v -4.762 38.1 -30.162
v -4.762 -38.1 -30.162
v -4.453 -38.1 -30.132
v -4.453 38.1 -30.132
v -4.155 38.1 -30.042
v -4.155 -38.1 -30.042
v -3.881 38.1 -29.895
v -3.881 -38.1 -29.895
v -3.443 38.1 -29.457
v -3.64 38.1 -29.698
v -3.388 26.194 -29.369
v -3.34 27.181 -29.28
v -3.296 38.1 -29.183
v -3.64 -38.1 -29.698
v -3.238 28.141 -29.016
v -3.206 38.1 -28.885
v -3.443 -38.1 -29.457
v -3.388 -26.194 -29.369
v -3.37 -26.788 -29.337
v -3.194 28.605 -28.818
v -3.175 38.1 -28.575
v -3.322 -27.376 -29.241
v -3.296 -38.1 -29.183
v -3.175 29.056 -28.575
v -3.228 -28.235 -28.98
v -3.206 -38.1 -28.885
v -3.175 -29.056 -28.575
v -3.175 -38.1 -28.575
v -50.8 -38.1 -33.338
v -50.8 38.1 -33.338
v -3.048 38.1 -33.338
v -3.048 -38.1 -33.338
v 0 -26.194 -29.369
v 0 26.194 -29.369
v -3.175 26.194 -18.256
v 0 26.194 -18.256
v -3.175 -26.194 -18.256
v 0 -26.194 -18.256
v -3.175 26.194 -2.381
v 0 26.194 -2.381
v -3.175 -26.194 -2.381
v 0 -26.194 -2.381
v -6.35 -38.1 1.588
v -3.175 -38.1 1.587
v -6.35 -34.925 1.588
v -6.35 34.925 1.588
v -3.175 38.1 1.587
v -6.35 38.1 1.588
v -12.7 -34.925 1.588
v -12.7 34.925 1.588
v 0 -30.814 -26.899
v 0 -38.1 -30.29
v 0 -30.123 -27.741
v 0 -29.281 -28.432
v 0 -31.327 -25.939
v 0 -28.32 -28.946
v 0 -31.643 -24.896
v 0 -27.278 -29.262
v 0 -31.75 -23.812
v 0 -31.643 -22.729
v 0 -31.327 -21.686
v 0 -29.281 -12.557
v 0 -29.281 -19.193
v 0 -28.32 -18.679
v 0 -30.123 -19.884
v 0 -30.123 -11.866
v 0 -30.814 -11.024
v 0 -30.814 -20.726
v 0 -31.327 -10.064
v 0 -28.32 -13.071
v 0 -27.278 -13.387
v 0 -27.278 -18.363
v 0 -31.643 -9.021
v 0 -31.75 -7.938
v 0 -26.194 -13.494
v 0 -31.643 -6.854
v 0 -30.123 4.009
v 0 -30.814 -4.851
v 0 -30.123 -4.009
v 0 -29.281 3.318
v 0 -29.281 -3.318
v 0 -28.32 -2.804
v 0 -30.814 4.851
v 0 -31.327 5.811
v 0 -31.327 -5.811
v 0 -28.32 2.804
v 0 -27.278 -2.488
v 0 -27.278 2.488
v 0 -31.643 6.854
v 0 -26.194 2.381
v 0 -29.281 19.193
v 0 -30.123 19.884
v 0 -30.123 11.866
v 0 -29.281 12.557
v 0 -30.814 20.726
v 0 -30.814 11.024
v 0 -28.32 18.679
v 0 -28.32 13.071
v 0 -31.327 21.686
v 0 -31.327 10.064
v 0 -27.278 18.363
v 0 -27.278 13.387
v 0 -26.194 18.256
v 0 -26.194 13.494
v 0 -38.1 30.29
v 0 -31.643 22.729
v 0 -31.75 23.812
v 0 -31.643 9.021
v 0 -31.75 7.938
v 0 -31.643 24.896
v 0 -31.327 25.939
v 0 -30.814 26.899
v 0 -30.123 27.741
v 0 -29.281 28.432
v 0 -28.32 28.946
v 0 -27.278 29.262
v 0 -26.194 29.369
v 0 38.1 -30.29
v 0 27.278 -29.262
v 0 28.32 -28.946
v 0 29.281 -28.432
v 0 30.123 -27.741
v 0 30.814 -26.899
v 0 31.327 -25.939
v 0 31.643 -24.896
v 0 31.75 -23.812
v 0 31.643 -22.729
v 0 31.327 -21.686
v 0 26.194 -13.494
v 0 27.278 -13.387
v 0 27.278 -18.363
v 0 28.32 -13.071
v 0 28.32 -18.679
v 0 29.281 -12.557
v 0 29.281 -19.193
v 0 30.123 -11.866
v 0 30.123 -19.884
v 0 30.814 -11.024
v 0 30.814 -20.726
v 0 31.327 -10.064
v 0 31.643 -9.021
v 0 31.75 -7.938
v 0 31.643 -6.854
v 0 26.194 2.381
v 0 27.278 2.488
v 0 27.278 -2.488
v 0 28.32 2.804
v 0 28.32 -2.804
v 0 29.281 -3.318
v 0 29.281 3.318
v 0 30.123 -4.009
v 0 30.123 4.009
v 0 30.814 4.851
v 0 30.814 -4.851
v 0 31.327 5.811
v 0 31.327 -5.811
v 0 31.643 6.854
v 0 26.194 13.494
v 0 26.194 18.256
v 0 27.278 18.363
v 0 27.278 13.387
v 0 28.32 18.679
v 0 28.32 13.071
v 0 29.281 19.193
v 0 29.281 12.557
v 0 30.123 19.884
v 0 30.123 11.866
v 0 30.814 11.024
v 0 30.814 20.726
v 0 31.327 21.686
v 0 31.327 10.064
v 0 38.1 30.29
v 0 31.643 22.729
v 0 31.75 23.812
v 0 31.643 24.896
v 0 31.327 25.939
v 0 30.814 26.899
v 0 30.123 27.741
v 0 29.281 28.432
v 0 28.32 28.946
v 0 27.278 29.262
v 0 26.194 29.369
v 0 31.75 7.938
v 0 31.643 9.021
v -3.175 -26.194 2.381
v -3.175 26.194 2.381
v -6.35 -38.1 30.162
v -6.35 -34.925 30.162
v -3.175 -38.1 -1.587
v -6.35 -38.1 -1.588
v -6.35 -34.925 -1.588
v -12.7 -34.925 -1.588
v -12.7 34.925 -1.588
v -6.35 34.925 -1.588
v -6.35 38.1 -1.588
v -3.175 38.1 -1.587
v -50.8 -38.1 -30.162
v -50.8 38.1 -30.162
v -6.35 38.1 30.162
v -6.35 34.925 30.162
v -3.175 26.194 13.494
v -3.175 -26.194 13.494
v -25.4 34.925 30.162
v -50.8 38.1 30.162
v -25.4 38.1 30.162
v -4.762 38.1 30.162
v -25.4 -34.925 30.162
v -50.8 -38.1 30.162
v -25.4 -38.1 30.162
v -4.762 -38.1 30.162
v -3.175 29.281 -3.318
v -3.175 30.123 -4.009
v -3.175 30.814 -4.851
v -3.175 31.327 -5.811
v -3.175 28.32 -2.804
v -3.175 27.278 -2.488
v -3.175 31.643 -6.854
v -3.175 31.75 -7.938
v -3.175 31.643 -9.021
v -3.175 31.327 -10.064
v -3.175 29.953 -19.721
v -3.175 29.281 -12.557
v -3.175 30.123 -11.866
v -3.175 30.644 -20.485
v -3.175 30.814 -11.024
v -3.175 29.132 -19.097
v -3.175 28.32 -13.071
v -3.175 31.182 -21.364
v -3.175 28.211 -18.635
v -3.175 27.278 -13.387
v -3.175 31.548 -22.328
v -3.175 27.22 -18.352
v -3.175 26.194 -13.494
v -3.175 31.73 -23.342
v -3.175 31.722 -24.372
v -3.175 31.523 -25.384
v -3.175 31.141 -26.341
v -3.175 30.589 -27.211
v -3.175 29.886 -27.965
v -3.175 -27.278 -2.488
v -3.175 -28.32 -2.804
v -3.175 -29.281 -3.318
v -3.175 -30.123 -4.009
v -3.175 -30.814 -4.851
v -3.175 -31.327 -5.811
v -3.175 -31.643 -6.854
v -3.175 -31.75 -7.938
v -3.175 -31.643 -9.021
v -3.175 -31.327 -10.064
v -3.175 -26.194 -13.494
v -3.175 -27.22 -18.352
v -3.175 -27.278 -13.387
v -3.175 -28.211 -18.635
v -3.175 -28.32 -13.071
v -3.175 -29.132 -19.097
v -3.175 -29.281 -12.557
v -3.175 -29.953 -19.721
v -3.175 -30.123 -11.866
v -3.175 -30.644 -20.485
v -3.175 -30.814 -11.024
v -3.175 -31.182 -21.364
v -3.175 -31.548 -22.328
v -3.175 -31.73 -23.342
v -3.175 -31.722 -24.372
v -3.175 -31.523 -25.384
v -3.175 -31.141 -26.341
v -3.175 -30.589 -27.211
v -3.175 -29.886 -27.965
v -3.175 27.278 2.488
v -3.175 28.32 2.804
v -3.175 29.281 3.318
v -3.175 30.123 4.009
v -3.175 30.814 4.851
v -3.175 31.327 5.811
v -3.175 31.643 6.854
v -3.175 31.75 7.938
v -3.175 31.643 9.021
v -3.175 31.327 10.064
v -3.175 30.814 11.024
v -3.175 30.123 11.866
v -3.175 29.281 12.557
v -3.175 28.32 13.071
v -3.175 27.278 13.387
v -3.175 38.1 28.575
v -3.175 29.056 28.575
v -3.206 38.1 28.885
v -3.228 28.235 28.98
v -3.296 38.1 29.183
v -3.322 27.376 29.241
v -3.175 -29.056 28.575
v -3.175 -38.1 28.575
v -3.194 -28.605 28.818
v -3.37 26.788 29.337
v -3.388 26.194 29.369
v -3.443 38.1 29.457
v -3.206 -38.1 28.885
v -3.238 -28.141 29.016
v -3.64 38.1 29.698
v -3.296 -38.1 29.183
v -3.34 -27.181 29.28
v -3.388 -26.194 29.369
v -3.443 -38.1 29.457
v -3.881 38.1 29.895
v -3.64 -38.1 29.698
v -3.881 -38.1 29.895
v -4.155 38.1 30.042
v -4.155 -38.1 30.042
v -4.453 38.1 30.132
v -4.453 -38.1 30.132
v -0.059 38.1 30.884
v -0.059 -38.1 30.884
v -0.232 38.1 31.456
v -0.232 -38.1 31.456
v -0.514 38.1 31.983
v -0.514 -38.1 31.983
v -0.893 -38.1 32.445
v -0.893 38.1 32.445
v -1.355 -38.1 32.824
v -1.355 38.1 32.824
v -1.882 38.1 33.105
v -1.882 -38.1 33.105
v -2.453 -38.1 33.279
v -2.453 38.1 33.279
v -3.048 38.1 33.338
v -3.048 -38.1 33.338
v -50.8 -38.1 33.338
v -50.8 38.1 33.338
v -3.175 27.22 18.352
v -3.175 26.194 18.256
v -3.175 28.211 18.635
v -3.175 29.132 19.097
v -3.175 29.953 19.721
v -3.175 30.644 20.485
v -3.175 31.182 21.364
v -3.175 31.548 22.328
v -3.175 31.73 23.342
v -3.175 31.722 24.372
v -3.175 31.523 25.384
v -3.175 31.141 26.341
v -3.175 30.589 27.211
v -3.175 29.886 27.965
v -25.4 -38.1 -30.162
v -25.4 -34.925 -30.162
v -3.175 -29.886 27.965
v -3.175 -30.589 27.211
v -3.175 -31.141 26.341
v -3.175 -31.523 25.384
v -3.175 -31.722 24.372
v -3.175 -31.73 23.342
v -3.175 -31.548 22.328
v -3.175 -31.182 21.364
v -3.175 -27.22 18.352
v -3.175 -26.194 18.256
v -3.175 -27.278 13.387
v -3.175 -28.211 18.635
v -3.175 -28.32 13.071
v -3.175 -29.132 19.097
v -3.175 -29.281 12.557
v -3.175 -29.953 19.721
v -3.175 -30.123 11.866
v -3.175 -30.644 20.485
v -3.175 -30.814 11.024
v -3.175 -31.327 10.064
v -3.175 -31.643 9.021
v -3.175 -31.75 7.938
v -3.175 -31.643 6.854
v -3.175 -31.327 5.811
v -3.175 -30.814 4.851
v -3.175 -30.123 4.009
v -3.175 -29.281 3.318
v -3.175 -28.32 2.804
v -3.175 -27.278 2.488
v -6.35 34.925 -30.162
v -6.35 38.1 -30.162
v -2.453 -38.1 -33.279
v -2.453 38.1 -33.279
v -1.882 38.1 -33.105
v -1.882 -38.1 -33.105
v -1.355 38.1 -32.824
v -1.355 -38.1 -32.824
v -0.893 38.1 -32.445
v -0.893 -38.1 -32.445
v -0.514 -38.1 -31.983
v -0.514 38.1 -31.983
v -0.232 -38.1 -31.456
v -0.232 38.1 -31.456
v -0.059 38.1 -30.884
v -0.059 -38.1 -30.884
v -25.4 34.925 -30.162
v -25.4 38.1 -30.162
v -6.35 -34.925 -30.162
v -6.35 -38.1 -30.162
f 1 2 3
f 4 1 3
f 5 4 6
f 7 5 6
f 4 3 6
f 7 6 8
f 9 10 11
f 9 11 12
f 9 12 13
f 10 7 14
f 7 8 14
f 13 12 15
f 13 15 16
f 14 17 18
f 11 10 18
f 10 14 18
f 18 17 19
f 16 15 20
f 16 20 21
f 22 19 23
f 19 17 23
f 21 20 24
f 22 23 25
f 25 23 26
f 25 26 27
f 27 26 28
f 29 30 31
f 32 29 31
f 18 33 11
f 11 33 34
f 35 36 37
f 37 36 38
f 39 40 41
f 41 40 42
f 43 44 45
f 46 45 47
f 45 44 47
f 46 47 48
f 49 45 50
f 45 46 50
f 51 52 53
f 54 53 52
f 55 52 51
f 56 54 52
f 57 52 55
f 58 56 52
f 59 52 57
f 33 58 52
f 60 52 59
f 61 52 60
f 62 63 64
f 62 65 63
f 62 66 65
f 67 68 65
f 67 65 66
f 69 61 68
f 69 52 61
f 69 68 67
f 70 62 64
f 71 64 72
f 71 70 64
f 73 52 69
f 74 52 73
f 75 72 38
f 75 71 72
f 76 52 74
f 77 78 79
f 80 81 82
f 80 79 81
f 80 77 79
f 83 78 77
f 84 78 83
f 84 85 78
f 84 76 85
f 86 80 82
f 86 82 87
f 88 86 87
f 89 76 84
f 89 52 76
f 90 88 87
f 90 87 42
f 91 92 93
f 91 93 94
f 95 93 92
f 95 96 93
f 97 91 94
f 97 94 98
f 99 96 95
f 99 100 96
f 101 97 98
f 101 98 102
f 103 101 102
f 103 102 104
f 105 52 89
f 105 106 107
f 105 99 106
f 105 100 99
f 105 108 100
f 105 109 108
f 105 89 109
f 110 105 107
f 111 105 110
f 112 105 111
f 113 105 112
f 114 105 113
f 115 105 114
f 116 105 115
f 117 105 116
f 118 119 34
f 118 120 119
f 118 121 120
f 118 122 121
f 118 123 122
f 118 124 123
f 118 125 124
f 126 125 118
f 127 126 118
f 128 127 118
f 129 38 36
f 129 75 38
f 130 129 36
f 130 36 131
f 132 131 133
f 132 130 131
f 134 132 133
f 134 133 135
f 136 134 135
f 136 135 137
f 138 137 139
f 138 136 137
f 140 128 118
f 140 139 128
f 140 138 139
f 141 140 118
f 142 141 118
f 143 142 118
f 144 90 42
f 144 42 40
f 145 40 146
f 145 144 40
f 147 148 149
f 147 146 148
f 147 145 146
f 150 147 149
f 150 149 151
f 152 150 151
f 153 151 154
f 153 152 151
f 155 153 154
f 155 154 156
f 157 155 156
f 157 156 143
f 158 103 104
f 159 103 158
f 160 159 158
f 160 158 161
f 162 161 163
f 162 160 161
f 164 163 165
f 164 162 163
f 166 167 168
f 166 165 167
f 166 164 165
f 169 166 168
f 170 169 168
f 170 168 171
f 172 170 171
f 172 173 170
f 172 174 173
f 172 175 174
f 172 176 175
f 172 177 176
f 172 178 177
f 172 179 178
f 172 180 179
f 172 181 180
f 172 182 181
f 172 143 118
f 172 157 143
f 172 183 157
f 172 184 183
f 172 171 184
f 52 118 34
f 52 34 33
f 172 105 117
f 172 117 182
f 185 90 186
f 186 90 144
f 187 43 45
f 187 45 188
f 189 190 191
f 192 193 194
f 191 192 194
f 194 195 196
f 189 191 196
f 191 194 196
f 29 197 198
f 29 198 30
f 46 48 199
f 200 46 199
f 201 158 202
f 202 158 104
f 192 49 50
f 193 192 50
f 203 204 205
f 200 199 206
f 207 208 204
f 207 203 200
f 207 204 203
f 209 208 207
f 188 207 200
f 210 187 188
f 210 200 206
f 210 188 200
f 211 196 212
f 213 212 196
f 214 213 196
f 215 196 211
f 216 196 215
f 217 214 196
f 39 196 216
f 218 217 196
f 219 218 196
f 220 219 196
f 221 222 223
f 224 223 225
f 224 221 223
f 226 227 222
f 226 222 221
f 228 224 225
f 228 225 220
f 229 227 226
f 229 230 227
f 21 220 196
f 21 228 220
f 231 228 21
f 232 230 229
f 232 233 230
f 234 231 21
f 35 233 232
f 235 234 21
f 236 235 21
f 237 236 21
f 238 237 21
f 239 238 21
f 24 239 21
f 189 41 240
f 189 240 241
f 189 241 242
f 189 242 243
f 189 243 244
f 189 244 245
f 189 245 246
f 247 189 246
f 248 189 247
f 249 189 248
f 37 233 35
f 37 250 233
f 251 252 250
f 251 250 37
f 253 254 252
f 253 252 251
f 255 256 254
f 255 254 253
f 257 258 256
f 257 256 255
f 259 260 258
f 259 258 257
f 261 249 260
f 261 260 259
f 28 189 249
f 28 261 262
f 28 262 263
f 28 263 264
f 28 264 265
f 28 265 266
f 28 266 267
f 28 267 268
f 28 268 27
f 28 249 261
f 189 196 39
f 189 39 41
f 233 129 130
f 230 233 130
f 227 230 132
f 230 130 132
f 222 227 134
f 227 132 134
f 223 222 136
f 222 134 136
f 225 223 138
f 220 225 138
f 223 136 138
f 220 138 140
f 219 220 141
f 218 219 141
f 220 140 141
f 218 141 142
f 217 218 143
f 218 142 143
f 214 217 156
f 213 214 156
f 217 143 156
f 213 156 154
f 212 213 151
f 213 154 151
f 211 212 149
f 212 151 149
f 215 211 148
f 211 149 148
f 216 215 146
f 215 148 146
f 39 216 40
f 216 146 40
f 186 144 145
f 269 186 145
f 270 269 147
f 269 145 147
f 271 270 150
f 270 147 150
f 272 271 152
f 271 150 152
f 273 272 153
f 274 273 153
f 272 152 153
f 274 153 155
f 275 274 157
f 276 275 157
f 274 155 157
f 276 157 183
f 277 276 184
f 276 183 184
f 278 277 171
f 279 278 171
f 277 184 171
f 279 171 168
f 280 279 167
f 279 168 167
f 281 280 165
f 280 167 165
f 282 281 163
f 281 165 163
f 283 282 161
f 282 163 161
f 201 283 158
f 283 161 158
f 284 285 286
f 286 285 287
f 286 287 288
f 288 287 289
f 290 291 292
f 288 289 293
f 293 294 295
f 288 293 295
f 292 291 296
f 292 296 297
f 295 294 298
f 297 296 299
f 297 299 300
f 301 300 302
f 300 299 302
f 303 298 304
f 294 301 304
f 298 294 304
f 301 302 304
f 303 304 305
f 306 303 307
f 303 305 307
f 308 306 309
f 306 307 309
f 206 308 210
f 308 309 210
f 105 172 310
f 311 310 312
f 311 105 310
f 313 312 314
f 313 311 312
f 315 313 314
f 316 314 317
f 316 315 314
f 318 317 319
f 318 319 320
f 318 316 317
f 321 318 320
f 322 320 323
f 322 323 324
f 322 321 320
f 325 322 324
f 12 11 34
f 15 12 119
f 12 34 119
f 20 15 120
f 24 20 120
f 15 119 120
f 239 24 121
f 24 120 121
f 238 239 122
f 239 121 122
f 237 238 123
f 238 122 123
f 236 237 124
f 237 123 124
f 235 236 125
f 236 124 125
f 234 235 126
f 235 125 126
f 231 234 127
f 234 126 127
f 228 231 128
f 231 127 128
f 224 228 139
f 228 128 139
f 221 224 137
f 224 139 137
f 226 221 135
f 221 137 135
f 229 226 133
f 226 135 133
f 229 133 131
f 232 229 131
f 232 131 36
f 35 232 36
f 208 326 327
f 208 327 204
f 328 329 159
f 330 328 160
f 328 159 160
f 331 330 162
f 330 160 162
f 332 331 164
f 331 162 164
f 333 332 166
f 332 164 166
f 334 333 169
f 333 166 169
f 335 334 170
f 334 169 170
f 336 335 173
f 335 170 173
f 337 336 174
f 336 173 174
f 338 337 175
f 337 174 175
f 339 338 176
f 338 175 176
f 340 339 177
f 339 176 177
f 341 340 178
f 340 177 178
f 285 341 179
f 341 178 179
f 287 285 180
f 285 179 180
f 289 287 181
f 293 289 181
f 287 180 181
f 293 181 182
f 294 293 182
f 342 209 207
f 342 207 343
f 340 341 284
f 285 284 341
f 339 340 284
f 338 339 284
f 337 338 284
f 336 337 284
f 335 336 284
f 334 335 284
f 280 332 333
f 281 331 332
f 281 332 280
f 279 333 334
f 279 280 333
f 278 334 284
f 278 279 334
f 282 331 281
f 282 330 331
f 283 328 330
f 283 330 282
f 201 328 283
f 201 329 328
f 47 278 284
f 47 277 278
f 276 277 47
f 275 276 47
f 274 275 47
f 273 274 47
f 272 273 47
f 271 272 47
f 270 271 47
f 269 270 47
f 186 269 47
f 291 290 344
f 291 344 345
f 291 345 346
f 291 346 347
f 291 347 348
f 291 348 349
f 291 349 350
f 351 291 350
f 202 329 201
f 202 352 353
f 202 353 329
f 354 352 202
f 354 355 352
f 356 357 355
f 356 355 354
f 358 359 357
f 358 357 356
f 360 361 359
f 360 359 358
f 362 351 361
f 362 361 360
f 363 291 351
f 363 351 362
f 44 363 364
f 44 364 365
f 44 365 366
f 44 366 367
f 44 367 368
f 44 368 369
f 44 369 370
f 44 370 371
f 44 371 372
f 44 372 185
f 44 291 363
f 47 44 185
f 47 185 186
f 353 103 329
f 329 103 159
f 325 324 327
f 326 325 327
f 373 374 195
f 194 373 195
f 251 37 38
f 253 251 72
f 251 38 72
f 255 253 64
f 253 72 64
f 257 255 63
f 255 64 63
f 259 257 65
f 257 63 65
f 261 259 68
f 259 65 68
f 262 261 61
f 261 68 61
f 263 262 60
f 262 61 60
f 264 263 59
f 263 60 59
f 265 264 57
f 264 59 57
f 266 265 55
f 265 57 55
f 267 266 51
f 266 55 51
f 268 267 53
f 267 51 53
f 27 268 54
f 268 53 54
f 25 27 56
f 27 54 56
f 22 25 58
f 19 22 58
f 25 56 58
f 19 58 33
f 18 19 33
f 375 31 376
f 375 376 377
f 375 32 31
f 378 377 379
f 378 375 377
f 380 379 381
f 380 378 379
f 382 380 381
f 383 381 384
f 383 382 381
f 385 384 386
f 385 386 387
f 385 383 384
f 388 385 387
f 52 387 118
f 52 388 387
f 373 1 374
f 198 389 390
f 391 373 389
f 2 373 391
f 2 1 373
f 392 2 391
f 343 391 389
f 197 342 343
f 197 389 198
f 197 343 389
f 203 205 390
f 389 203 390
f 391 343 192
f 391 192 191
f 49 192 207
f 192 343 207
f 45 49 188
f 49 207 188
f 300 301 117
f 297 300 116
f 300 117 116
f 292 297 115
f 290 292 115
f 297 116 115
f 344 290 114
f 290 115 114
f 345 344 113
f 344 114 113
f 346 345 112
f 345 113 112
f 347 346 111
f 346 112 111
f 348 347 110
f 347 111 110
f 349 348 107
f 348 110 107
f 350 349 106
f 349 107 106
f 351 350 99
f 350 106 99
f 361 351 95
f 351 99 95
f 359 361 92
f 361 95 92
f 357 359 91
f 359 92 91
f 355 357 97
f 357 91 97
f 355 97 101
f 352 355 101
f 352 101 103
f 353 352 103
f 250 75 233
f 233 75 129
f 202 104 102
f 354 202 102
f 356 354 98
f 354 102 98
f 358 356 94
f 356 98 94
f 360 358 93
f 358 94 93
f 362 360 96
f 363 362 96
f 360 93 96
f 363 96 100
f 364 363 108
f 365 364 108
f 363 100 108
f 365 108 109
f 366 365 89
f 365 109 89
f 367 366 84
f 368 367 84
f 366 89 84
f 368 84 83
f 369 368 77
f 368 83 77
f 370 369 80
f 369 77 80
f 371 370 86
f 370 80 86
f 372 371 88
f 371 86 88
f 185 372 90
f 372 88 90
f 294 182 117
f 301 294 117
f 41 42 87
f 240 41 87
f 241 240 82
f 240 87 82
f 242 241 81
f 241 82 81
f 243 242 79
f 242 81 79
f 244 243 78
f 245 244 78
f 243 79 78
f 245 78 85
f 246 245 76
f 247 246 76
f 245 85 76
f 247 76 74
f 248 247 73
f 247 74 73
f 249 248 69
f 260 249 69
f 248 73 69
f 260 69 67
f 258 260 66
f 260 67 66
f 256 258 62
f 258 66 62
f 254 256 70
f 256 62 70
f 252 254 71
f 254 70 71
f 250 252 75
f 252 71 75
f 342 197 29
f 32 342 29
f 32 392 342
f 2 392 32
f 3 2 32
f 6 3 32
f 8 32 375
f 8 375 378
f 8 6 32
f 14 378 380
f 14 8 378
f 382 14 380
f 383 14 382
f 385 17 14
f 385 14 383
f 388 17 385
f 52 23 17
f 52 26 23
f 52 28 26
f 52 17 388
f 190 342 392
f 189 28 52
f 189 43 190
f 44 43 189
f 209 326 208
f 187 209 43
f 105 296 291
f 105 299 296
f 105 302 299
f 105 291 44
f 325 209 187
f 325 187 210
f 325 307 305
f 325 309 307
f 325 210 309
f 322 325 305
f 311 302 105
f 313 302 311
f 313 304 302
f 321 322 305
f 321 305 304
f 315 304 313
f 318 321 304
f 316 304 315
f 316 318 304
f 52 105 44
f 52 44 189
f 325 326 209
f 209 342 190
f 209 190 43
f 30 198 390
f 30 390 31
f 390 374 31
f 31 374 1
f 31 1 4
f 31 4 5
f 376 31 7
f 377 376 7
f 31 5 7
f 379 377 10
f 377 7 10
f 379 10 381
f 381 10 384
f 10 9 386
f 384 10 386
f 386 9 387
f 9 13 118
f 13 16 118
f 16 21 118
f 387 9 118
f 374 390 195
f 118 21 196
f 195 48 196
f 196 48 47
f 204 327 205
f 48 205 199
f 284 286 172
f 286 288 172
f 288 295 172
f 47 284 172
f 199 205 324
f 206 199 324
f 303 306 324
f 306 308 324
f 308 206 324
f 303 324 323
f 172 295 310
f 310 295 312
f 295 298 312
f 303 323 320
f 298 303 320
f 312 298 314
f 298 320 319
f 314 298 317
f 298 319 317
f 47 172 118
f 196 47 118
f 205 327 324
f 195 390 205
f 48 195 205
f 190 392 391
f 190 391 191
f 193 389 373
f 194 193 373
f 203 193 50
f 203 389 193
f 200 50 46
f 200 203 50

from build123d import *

# Parameters (mm, degrees)
PAD7411_DEPTH   = 38.1
PAD7409_DEPTH   = 3.175
SKETCH8433_W    = 76.2
SKETCH8433_H    = 3.175
PAD7410_DEPTH   = 12.7
POCKET693_DEPTH = 50.801


with BuildPart() as part:
    # Sketch8434 → Pad7411 (new body, symmetric)
    with BuildSketch(Plane.XZ):
        with BuildLine():
            ThreePointArc((0, 30.2895), (-0.892739, 32.444761), (-3.048, 33.3375))
            Line((-3.048, 33.3375), (-50.8, 33.3375))
            Line((-50.8, 33.3375), (-50.8, 30.1625))
            Line((-50.8, 30.1625), (-4.7625, 30.1625))
            ThreePointArc((-3.175, 28.575), (-3.639968, 29.697532), (-4.7625, 30.1625))
            Line((-3.175, 28.575), (-3.175, -28.575))
            ThreePointArc((-4.7625, -30.1625), (-3.639968, -29.697532), (-3.175, -28.575))
            Line((-4.7625, -30.1625), (-50.8, -30.1625))
            Line((-50.8, -30.1625), (-50.8, -33.3375))
            Line((-50.8, -33.3375), (-3.048, -33.3375))
            ThreePointArc((-3.048, -33.3375), (-0.892739, -32.444761), (0, -30.2895))
            Line((0, -30.2895), (0, 30.2895))
        make_face()
    extrude(amount=PAD7411_DEPTH, both=True)

    # Sketch8432 (on DatumPlane) → Pad7409 (join)
    with BuildSketch(Plane.XZ.offset(38.1)):
        Polygon((-25.4, 33.02), (-25.4, -33.02), (-6.35, -33.02), (-6.35, -1.5875), (0, -1.5875), (0, 1.5875), (-6.35, 1.5875), (-6.35, 33.02), align=None)
    pad7409 = extrude(amount=-PAD7409_DEPTH)

    # Mirrored019: Pad7409 across XZ
    add(pad7409.mirror(Plane.XZ))

    # Sketch8433 → Pad7410 (join)
    with BuildSketch(Plane.YZ):
        Rectangle(SKETCH8433_W, SKETCH8433_H)
    extrude(amount=-PAD7410_DEPTH)

    # Sketch8435 → Pocket693 (cut, through all)
    with BuildSketch(Plane.YZ):
        with BuildLine():
            ThreePointArc((26.19375, 18.25625), (31.75, 23.8125), (26.19375, 29.36875))
            Line((26.19375, 29.36875), (-26.19375, 29.36875))
            ThreePointArc((-26.19375, 29.36875), (-31.75, 23.8125), (-26.19375, 18.25625))
            Line((-26.19375, 18.25625), (26.19375, 18.25625))
        make_face()
        with BuildLine():
            ThreePointArc((26.19375, 2.38125), (31.75, 7.9375), (26.19375, 13.49375))
            Line((26.19375, 13.49375), (-26.19375, 13.49375))
            ThreePointArc((-26.19375, 13.49375), (-31.75, 7.9375), (-26.19375, 2.38125))
            Line((-26.19375, 2.38125), (26.19375, 2.38125))
        make_face()
        with BuildLine():
            ThreePointArc((26.19375, -13.49375), (31.75, -7.9375), (26.19375, -2.38125))
            Line((26.19375, -2.38125), (-26.19375, -2.38125))
            ThreePointArc((-26.19375, -2.38125), (-31.75, -7.9375), (-26.19375, -13.49375))
            Line((-26.19375, -13.49375), (26.19375, -13.49375))
        make_face()
        with BuildLine():
            ThreePointArc((26.19375, -29.36875), (31.75, -23.8125), (26.19375, -18.25625))
            Line((26.19375, -18.25625), (-26.19375, -18.25625))
            ThreePointArc((-26.19375, -18.25625), (-31.75, -23.8125), (-26.19375, -29.36875))
            Line((-26.19375, -29.36875), (26.19375, -29.36875))
        make_face()
    extrude(amount=-POCKET693_DEPTH, mode=Mode.SUBTRACT)


solid = part.part
